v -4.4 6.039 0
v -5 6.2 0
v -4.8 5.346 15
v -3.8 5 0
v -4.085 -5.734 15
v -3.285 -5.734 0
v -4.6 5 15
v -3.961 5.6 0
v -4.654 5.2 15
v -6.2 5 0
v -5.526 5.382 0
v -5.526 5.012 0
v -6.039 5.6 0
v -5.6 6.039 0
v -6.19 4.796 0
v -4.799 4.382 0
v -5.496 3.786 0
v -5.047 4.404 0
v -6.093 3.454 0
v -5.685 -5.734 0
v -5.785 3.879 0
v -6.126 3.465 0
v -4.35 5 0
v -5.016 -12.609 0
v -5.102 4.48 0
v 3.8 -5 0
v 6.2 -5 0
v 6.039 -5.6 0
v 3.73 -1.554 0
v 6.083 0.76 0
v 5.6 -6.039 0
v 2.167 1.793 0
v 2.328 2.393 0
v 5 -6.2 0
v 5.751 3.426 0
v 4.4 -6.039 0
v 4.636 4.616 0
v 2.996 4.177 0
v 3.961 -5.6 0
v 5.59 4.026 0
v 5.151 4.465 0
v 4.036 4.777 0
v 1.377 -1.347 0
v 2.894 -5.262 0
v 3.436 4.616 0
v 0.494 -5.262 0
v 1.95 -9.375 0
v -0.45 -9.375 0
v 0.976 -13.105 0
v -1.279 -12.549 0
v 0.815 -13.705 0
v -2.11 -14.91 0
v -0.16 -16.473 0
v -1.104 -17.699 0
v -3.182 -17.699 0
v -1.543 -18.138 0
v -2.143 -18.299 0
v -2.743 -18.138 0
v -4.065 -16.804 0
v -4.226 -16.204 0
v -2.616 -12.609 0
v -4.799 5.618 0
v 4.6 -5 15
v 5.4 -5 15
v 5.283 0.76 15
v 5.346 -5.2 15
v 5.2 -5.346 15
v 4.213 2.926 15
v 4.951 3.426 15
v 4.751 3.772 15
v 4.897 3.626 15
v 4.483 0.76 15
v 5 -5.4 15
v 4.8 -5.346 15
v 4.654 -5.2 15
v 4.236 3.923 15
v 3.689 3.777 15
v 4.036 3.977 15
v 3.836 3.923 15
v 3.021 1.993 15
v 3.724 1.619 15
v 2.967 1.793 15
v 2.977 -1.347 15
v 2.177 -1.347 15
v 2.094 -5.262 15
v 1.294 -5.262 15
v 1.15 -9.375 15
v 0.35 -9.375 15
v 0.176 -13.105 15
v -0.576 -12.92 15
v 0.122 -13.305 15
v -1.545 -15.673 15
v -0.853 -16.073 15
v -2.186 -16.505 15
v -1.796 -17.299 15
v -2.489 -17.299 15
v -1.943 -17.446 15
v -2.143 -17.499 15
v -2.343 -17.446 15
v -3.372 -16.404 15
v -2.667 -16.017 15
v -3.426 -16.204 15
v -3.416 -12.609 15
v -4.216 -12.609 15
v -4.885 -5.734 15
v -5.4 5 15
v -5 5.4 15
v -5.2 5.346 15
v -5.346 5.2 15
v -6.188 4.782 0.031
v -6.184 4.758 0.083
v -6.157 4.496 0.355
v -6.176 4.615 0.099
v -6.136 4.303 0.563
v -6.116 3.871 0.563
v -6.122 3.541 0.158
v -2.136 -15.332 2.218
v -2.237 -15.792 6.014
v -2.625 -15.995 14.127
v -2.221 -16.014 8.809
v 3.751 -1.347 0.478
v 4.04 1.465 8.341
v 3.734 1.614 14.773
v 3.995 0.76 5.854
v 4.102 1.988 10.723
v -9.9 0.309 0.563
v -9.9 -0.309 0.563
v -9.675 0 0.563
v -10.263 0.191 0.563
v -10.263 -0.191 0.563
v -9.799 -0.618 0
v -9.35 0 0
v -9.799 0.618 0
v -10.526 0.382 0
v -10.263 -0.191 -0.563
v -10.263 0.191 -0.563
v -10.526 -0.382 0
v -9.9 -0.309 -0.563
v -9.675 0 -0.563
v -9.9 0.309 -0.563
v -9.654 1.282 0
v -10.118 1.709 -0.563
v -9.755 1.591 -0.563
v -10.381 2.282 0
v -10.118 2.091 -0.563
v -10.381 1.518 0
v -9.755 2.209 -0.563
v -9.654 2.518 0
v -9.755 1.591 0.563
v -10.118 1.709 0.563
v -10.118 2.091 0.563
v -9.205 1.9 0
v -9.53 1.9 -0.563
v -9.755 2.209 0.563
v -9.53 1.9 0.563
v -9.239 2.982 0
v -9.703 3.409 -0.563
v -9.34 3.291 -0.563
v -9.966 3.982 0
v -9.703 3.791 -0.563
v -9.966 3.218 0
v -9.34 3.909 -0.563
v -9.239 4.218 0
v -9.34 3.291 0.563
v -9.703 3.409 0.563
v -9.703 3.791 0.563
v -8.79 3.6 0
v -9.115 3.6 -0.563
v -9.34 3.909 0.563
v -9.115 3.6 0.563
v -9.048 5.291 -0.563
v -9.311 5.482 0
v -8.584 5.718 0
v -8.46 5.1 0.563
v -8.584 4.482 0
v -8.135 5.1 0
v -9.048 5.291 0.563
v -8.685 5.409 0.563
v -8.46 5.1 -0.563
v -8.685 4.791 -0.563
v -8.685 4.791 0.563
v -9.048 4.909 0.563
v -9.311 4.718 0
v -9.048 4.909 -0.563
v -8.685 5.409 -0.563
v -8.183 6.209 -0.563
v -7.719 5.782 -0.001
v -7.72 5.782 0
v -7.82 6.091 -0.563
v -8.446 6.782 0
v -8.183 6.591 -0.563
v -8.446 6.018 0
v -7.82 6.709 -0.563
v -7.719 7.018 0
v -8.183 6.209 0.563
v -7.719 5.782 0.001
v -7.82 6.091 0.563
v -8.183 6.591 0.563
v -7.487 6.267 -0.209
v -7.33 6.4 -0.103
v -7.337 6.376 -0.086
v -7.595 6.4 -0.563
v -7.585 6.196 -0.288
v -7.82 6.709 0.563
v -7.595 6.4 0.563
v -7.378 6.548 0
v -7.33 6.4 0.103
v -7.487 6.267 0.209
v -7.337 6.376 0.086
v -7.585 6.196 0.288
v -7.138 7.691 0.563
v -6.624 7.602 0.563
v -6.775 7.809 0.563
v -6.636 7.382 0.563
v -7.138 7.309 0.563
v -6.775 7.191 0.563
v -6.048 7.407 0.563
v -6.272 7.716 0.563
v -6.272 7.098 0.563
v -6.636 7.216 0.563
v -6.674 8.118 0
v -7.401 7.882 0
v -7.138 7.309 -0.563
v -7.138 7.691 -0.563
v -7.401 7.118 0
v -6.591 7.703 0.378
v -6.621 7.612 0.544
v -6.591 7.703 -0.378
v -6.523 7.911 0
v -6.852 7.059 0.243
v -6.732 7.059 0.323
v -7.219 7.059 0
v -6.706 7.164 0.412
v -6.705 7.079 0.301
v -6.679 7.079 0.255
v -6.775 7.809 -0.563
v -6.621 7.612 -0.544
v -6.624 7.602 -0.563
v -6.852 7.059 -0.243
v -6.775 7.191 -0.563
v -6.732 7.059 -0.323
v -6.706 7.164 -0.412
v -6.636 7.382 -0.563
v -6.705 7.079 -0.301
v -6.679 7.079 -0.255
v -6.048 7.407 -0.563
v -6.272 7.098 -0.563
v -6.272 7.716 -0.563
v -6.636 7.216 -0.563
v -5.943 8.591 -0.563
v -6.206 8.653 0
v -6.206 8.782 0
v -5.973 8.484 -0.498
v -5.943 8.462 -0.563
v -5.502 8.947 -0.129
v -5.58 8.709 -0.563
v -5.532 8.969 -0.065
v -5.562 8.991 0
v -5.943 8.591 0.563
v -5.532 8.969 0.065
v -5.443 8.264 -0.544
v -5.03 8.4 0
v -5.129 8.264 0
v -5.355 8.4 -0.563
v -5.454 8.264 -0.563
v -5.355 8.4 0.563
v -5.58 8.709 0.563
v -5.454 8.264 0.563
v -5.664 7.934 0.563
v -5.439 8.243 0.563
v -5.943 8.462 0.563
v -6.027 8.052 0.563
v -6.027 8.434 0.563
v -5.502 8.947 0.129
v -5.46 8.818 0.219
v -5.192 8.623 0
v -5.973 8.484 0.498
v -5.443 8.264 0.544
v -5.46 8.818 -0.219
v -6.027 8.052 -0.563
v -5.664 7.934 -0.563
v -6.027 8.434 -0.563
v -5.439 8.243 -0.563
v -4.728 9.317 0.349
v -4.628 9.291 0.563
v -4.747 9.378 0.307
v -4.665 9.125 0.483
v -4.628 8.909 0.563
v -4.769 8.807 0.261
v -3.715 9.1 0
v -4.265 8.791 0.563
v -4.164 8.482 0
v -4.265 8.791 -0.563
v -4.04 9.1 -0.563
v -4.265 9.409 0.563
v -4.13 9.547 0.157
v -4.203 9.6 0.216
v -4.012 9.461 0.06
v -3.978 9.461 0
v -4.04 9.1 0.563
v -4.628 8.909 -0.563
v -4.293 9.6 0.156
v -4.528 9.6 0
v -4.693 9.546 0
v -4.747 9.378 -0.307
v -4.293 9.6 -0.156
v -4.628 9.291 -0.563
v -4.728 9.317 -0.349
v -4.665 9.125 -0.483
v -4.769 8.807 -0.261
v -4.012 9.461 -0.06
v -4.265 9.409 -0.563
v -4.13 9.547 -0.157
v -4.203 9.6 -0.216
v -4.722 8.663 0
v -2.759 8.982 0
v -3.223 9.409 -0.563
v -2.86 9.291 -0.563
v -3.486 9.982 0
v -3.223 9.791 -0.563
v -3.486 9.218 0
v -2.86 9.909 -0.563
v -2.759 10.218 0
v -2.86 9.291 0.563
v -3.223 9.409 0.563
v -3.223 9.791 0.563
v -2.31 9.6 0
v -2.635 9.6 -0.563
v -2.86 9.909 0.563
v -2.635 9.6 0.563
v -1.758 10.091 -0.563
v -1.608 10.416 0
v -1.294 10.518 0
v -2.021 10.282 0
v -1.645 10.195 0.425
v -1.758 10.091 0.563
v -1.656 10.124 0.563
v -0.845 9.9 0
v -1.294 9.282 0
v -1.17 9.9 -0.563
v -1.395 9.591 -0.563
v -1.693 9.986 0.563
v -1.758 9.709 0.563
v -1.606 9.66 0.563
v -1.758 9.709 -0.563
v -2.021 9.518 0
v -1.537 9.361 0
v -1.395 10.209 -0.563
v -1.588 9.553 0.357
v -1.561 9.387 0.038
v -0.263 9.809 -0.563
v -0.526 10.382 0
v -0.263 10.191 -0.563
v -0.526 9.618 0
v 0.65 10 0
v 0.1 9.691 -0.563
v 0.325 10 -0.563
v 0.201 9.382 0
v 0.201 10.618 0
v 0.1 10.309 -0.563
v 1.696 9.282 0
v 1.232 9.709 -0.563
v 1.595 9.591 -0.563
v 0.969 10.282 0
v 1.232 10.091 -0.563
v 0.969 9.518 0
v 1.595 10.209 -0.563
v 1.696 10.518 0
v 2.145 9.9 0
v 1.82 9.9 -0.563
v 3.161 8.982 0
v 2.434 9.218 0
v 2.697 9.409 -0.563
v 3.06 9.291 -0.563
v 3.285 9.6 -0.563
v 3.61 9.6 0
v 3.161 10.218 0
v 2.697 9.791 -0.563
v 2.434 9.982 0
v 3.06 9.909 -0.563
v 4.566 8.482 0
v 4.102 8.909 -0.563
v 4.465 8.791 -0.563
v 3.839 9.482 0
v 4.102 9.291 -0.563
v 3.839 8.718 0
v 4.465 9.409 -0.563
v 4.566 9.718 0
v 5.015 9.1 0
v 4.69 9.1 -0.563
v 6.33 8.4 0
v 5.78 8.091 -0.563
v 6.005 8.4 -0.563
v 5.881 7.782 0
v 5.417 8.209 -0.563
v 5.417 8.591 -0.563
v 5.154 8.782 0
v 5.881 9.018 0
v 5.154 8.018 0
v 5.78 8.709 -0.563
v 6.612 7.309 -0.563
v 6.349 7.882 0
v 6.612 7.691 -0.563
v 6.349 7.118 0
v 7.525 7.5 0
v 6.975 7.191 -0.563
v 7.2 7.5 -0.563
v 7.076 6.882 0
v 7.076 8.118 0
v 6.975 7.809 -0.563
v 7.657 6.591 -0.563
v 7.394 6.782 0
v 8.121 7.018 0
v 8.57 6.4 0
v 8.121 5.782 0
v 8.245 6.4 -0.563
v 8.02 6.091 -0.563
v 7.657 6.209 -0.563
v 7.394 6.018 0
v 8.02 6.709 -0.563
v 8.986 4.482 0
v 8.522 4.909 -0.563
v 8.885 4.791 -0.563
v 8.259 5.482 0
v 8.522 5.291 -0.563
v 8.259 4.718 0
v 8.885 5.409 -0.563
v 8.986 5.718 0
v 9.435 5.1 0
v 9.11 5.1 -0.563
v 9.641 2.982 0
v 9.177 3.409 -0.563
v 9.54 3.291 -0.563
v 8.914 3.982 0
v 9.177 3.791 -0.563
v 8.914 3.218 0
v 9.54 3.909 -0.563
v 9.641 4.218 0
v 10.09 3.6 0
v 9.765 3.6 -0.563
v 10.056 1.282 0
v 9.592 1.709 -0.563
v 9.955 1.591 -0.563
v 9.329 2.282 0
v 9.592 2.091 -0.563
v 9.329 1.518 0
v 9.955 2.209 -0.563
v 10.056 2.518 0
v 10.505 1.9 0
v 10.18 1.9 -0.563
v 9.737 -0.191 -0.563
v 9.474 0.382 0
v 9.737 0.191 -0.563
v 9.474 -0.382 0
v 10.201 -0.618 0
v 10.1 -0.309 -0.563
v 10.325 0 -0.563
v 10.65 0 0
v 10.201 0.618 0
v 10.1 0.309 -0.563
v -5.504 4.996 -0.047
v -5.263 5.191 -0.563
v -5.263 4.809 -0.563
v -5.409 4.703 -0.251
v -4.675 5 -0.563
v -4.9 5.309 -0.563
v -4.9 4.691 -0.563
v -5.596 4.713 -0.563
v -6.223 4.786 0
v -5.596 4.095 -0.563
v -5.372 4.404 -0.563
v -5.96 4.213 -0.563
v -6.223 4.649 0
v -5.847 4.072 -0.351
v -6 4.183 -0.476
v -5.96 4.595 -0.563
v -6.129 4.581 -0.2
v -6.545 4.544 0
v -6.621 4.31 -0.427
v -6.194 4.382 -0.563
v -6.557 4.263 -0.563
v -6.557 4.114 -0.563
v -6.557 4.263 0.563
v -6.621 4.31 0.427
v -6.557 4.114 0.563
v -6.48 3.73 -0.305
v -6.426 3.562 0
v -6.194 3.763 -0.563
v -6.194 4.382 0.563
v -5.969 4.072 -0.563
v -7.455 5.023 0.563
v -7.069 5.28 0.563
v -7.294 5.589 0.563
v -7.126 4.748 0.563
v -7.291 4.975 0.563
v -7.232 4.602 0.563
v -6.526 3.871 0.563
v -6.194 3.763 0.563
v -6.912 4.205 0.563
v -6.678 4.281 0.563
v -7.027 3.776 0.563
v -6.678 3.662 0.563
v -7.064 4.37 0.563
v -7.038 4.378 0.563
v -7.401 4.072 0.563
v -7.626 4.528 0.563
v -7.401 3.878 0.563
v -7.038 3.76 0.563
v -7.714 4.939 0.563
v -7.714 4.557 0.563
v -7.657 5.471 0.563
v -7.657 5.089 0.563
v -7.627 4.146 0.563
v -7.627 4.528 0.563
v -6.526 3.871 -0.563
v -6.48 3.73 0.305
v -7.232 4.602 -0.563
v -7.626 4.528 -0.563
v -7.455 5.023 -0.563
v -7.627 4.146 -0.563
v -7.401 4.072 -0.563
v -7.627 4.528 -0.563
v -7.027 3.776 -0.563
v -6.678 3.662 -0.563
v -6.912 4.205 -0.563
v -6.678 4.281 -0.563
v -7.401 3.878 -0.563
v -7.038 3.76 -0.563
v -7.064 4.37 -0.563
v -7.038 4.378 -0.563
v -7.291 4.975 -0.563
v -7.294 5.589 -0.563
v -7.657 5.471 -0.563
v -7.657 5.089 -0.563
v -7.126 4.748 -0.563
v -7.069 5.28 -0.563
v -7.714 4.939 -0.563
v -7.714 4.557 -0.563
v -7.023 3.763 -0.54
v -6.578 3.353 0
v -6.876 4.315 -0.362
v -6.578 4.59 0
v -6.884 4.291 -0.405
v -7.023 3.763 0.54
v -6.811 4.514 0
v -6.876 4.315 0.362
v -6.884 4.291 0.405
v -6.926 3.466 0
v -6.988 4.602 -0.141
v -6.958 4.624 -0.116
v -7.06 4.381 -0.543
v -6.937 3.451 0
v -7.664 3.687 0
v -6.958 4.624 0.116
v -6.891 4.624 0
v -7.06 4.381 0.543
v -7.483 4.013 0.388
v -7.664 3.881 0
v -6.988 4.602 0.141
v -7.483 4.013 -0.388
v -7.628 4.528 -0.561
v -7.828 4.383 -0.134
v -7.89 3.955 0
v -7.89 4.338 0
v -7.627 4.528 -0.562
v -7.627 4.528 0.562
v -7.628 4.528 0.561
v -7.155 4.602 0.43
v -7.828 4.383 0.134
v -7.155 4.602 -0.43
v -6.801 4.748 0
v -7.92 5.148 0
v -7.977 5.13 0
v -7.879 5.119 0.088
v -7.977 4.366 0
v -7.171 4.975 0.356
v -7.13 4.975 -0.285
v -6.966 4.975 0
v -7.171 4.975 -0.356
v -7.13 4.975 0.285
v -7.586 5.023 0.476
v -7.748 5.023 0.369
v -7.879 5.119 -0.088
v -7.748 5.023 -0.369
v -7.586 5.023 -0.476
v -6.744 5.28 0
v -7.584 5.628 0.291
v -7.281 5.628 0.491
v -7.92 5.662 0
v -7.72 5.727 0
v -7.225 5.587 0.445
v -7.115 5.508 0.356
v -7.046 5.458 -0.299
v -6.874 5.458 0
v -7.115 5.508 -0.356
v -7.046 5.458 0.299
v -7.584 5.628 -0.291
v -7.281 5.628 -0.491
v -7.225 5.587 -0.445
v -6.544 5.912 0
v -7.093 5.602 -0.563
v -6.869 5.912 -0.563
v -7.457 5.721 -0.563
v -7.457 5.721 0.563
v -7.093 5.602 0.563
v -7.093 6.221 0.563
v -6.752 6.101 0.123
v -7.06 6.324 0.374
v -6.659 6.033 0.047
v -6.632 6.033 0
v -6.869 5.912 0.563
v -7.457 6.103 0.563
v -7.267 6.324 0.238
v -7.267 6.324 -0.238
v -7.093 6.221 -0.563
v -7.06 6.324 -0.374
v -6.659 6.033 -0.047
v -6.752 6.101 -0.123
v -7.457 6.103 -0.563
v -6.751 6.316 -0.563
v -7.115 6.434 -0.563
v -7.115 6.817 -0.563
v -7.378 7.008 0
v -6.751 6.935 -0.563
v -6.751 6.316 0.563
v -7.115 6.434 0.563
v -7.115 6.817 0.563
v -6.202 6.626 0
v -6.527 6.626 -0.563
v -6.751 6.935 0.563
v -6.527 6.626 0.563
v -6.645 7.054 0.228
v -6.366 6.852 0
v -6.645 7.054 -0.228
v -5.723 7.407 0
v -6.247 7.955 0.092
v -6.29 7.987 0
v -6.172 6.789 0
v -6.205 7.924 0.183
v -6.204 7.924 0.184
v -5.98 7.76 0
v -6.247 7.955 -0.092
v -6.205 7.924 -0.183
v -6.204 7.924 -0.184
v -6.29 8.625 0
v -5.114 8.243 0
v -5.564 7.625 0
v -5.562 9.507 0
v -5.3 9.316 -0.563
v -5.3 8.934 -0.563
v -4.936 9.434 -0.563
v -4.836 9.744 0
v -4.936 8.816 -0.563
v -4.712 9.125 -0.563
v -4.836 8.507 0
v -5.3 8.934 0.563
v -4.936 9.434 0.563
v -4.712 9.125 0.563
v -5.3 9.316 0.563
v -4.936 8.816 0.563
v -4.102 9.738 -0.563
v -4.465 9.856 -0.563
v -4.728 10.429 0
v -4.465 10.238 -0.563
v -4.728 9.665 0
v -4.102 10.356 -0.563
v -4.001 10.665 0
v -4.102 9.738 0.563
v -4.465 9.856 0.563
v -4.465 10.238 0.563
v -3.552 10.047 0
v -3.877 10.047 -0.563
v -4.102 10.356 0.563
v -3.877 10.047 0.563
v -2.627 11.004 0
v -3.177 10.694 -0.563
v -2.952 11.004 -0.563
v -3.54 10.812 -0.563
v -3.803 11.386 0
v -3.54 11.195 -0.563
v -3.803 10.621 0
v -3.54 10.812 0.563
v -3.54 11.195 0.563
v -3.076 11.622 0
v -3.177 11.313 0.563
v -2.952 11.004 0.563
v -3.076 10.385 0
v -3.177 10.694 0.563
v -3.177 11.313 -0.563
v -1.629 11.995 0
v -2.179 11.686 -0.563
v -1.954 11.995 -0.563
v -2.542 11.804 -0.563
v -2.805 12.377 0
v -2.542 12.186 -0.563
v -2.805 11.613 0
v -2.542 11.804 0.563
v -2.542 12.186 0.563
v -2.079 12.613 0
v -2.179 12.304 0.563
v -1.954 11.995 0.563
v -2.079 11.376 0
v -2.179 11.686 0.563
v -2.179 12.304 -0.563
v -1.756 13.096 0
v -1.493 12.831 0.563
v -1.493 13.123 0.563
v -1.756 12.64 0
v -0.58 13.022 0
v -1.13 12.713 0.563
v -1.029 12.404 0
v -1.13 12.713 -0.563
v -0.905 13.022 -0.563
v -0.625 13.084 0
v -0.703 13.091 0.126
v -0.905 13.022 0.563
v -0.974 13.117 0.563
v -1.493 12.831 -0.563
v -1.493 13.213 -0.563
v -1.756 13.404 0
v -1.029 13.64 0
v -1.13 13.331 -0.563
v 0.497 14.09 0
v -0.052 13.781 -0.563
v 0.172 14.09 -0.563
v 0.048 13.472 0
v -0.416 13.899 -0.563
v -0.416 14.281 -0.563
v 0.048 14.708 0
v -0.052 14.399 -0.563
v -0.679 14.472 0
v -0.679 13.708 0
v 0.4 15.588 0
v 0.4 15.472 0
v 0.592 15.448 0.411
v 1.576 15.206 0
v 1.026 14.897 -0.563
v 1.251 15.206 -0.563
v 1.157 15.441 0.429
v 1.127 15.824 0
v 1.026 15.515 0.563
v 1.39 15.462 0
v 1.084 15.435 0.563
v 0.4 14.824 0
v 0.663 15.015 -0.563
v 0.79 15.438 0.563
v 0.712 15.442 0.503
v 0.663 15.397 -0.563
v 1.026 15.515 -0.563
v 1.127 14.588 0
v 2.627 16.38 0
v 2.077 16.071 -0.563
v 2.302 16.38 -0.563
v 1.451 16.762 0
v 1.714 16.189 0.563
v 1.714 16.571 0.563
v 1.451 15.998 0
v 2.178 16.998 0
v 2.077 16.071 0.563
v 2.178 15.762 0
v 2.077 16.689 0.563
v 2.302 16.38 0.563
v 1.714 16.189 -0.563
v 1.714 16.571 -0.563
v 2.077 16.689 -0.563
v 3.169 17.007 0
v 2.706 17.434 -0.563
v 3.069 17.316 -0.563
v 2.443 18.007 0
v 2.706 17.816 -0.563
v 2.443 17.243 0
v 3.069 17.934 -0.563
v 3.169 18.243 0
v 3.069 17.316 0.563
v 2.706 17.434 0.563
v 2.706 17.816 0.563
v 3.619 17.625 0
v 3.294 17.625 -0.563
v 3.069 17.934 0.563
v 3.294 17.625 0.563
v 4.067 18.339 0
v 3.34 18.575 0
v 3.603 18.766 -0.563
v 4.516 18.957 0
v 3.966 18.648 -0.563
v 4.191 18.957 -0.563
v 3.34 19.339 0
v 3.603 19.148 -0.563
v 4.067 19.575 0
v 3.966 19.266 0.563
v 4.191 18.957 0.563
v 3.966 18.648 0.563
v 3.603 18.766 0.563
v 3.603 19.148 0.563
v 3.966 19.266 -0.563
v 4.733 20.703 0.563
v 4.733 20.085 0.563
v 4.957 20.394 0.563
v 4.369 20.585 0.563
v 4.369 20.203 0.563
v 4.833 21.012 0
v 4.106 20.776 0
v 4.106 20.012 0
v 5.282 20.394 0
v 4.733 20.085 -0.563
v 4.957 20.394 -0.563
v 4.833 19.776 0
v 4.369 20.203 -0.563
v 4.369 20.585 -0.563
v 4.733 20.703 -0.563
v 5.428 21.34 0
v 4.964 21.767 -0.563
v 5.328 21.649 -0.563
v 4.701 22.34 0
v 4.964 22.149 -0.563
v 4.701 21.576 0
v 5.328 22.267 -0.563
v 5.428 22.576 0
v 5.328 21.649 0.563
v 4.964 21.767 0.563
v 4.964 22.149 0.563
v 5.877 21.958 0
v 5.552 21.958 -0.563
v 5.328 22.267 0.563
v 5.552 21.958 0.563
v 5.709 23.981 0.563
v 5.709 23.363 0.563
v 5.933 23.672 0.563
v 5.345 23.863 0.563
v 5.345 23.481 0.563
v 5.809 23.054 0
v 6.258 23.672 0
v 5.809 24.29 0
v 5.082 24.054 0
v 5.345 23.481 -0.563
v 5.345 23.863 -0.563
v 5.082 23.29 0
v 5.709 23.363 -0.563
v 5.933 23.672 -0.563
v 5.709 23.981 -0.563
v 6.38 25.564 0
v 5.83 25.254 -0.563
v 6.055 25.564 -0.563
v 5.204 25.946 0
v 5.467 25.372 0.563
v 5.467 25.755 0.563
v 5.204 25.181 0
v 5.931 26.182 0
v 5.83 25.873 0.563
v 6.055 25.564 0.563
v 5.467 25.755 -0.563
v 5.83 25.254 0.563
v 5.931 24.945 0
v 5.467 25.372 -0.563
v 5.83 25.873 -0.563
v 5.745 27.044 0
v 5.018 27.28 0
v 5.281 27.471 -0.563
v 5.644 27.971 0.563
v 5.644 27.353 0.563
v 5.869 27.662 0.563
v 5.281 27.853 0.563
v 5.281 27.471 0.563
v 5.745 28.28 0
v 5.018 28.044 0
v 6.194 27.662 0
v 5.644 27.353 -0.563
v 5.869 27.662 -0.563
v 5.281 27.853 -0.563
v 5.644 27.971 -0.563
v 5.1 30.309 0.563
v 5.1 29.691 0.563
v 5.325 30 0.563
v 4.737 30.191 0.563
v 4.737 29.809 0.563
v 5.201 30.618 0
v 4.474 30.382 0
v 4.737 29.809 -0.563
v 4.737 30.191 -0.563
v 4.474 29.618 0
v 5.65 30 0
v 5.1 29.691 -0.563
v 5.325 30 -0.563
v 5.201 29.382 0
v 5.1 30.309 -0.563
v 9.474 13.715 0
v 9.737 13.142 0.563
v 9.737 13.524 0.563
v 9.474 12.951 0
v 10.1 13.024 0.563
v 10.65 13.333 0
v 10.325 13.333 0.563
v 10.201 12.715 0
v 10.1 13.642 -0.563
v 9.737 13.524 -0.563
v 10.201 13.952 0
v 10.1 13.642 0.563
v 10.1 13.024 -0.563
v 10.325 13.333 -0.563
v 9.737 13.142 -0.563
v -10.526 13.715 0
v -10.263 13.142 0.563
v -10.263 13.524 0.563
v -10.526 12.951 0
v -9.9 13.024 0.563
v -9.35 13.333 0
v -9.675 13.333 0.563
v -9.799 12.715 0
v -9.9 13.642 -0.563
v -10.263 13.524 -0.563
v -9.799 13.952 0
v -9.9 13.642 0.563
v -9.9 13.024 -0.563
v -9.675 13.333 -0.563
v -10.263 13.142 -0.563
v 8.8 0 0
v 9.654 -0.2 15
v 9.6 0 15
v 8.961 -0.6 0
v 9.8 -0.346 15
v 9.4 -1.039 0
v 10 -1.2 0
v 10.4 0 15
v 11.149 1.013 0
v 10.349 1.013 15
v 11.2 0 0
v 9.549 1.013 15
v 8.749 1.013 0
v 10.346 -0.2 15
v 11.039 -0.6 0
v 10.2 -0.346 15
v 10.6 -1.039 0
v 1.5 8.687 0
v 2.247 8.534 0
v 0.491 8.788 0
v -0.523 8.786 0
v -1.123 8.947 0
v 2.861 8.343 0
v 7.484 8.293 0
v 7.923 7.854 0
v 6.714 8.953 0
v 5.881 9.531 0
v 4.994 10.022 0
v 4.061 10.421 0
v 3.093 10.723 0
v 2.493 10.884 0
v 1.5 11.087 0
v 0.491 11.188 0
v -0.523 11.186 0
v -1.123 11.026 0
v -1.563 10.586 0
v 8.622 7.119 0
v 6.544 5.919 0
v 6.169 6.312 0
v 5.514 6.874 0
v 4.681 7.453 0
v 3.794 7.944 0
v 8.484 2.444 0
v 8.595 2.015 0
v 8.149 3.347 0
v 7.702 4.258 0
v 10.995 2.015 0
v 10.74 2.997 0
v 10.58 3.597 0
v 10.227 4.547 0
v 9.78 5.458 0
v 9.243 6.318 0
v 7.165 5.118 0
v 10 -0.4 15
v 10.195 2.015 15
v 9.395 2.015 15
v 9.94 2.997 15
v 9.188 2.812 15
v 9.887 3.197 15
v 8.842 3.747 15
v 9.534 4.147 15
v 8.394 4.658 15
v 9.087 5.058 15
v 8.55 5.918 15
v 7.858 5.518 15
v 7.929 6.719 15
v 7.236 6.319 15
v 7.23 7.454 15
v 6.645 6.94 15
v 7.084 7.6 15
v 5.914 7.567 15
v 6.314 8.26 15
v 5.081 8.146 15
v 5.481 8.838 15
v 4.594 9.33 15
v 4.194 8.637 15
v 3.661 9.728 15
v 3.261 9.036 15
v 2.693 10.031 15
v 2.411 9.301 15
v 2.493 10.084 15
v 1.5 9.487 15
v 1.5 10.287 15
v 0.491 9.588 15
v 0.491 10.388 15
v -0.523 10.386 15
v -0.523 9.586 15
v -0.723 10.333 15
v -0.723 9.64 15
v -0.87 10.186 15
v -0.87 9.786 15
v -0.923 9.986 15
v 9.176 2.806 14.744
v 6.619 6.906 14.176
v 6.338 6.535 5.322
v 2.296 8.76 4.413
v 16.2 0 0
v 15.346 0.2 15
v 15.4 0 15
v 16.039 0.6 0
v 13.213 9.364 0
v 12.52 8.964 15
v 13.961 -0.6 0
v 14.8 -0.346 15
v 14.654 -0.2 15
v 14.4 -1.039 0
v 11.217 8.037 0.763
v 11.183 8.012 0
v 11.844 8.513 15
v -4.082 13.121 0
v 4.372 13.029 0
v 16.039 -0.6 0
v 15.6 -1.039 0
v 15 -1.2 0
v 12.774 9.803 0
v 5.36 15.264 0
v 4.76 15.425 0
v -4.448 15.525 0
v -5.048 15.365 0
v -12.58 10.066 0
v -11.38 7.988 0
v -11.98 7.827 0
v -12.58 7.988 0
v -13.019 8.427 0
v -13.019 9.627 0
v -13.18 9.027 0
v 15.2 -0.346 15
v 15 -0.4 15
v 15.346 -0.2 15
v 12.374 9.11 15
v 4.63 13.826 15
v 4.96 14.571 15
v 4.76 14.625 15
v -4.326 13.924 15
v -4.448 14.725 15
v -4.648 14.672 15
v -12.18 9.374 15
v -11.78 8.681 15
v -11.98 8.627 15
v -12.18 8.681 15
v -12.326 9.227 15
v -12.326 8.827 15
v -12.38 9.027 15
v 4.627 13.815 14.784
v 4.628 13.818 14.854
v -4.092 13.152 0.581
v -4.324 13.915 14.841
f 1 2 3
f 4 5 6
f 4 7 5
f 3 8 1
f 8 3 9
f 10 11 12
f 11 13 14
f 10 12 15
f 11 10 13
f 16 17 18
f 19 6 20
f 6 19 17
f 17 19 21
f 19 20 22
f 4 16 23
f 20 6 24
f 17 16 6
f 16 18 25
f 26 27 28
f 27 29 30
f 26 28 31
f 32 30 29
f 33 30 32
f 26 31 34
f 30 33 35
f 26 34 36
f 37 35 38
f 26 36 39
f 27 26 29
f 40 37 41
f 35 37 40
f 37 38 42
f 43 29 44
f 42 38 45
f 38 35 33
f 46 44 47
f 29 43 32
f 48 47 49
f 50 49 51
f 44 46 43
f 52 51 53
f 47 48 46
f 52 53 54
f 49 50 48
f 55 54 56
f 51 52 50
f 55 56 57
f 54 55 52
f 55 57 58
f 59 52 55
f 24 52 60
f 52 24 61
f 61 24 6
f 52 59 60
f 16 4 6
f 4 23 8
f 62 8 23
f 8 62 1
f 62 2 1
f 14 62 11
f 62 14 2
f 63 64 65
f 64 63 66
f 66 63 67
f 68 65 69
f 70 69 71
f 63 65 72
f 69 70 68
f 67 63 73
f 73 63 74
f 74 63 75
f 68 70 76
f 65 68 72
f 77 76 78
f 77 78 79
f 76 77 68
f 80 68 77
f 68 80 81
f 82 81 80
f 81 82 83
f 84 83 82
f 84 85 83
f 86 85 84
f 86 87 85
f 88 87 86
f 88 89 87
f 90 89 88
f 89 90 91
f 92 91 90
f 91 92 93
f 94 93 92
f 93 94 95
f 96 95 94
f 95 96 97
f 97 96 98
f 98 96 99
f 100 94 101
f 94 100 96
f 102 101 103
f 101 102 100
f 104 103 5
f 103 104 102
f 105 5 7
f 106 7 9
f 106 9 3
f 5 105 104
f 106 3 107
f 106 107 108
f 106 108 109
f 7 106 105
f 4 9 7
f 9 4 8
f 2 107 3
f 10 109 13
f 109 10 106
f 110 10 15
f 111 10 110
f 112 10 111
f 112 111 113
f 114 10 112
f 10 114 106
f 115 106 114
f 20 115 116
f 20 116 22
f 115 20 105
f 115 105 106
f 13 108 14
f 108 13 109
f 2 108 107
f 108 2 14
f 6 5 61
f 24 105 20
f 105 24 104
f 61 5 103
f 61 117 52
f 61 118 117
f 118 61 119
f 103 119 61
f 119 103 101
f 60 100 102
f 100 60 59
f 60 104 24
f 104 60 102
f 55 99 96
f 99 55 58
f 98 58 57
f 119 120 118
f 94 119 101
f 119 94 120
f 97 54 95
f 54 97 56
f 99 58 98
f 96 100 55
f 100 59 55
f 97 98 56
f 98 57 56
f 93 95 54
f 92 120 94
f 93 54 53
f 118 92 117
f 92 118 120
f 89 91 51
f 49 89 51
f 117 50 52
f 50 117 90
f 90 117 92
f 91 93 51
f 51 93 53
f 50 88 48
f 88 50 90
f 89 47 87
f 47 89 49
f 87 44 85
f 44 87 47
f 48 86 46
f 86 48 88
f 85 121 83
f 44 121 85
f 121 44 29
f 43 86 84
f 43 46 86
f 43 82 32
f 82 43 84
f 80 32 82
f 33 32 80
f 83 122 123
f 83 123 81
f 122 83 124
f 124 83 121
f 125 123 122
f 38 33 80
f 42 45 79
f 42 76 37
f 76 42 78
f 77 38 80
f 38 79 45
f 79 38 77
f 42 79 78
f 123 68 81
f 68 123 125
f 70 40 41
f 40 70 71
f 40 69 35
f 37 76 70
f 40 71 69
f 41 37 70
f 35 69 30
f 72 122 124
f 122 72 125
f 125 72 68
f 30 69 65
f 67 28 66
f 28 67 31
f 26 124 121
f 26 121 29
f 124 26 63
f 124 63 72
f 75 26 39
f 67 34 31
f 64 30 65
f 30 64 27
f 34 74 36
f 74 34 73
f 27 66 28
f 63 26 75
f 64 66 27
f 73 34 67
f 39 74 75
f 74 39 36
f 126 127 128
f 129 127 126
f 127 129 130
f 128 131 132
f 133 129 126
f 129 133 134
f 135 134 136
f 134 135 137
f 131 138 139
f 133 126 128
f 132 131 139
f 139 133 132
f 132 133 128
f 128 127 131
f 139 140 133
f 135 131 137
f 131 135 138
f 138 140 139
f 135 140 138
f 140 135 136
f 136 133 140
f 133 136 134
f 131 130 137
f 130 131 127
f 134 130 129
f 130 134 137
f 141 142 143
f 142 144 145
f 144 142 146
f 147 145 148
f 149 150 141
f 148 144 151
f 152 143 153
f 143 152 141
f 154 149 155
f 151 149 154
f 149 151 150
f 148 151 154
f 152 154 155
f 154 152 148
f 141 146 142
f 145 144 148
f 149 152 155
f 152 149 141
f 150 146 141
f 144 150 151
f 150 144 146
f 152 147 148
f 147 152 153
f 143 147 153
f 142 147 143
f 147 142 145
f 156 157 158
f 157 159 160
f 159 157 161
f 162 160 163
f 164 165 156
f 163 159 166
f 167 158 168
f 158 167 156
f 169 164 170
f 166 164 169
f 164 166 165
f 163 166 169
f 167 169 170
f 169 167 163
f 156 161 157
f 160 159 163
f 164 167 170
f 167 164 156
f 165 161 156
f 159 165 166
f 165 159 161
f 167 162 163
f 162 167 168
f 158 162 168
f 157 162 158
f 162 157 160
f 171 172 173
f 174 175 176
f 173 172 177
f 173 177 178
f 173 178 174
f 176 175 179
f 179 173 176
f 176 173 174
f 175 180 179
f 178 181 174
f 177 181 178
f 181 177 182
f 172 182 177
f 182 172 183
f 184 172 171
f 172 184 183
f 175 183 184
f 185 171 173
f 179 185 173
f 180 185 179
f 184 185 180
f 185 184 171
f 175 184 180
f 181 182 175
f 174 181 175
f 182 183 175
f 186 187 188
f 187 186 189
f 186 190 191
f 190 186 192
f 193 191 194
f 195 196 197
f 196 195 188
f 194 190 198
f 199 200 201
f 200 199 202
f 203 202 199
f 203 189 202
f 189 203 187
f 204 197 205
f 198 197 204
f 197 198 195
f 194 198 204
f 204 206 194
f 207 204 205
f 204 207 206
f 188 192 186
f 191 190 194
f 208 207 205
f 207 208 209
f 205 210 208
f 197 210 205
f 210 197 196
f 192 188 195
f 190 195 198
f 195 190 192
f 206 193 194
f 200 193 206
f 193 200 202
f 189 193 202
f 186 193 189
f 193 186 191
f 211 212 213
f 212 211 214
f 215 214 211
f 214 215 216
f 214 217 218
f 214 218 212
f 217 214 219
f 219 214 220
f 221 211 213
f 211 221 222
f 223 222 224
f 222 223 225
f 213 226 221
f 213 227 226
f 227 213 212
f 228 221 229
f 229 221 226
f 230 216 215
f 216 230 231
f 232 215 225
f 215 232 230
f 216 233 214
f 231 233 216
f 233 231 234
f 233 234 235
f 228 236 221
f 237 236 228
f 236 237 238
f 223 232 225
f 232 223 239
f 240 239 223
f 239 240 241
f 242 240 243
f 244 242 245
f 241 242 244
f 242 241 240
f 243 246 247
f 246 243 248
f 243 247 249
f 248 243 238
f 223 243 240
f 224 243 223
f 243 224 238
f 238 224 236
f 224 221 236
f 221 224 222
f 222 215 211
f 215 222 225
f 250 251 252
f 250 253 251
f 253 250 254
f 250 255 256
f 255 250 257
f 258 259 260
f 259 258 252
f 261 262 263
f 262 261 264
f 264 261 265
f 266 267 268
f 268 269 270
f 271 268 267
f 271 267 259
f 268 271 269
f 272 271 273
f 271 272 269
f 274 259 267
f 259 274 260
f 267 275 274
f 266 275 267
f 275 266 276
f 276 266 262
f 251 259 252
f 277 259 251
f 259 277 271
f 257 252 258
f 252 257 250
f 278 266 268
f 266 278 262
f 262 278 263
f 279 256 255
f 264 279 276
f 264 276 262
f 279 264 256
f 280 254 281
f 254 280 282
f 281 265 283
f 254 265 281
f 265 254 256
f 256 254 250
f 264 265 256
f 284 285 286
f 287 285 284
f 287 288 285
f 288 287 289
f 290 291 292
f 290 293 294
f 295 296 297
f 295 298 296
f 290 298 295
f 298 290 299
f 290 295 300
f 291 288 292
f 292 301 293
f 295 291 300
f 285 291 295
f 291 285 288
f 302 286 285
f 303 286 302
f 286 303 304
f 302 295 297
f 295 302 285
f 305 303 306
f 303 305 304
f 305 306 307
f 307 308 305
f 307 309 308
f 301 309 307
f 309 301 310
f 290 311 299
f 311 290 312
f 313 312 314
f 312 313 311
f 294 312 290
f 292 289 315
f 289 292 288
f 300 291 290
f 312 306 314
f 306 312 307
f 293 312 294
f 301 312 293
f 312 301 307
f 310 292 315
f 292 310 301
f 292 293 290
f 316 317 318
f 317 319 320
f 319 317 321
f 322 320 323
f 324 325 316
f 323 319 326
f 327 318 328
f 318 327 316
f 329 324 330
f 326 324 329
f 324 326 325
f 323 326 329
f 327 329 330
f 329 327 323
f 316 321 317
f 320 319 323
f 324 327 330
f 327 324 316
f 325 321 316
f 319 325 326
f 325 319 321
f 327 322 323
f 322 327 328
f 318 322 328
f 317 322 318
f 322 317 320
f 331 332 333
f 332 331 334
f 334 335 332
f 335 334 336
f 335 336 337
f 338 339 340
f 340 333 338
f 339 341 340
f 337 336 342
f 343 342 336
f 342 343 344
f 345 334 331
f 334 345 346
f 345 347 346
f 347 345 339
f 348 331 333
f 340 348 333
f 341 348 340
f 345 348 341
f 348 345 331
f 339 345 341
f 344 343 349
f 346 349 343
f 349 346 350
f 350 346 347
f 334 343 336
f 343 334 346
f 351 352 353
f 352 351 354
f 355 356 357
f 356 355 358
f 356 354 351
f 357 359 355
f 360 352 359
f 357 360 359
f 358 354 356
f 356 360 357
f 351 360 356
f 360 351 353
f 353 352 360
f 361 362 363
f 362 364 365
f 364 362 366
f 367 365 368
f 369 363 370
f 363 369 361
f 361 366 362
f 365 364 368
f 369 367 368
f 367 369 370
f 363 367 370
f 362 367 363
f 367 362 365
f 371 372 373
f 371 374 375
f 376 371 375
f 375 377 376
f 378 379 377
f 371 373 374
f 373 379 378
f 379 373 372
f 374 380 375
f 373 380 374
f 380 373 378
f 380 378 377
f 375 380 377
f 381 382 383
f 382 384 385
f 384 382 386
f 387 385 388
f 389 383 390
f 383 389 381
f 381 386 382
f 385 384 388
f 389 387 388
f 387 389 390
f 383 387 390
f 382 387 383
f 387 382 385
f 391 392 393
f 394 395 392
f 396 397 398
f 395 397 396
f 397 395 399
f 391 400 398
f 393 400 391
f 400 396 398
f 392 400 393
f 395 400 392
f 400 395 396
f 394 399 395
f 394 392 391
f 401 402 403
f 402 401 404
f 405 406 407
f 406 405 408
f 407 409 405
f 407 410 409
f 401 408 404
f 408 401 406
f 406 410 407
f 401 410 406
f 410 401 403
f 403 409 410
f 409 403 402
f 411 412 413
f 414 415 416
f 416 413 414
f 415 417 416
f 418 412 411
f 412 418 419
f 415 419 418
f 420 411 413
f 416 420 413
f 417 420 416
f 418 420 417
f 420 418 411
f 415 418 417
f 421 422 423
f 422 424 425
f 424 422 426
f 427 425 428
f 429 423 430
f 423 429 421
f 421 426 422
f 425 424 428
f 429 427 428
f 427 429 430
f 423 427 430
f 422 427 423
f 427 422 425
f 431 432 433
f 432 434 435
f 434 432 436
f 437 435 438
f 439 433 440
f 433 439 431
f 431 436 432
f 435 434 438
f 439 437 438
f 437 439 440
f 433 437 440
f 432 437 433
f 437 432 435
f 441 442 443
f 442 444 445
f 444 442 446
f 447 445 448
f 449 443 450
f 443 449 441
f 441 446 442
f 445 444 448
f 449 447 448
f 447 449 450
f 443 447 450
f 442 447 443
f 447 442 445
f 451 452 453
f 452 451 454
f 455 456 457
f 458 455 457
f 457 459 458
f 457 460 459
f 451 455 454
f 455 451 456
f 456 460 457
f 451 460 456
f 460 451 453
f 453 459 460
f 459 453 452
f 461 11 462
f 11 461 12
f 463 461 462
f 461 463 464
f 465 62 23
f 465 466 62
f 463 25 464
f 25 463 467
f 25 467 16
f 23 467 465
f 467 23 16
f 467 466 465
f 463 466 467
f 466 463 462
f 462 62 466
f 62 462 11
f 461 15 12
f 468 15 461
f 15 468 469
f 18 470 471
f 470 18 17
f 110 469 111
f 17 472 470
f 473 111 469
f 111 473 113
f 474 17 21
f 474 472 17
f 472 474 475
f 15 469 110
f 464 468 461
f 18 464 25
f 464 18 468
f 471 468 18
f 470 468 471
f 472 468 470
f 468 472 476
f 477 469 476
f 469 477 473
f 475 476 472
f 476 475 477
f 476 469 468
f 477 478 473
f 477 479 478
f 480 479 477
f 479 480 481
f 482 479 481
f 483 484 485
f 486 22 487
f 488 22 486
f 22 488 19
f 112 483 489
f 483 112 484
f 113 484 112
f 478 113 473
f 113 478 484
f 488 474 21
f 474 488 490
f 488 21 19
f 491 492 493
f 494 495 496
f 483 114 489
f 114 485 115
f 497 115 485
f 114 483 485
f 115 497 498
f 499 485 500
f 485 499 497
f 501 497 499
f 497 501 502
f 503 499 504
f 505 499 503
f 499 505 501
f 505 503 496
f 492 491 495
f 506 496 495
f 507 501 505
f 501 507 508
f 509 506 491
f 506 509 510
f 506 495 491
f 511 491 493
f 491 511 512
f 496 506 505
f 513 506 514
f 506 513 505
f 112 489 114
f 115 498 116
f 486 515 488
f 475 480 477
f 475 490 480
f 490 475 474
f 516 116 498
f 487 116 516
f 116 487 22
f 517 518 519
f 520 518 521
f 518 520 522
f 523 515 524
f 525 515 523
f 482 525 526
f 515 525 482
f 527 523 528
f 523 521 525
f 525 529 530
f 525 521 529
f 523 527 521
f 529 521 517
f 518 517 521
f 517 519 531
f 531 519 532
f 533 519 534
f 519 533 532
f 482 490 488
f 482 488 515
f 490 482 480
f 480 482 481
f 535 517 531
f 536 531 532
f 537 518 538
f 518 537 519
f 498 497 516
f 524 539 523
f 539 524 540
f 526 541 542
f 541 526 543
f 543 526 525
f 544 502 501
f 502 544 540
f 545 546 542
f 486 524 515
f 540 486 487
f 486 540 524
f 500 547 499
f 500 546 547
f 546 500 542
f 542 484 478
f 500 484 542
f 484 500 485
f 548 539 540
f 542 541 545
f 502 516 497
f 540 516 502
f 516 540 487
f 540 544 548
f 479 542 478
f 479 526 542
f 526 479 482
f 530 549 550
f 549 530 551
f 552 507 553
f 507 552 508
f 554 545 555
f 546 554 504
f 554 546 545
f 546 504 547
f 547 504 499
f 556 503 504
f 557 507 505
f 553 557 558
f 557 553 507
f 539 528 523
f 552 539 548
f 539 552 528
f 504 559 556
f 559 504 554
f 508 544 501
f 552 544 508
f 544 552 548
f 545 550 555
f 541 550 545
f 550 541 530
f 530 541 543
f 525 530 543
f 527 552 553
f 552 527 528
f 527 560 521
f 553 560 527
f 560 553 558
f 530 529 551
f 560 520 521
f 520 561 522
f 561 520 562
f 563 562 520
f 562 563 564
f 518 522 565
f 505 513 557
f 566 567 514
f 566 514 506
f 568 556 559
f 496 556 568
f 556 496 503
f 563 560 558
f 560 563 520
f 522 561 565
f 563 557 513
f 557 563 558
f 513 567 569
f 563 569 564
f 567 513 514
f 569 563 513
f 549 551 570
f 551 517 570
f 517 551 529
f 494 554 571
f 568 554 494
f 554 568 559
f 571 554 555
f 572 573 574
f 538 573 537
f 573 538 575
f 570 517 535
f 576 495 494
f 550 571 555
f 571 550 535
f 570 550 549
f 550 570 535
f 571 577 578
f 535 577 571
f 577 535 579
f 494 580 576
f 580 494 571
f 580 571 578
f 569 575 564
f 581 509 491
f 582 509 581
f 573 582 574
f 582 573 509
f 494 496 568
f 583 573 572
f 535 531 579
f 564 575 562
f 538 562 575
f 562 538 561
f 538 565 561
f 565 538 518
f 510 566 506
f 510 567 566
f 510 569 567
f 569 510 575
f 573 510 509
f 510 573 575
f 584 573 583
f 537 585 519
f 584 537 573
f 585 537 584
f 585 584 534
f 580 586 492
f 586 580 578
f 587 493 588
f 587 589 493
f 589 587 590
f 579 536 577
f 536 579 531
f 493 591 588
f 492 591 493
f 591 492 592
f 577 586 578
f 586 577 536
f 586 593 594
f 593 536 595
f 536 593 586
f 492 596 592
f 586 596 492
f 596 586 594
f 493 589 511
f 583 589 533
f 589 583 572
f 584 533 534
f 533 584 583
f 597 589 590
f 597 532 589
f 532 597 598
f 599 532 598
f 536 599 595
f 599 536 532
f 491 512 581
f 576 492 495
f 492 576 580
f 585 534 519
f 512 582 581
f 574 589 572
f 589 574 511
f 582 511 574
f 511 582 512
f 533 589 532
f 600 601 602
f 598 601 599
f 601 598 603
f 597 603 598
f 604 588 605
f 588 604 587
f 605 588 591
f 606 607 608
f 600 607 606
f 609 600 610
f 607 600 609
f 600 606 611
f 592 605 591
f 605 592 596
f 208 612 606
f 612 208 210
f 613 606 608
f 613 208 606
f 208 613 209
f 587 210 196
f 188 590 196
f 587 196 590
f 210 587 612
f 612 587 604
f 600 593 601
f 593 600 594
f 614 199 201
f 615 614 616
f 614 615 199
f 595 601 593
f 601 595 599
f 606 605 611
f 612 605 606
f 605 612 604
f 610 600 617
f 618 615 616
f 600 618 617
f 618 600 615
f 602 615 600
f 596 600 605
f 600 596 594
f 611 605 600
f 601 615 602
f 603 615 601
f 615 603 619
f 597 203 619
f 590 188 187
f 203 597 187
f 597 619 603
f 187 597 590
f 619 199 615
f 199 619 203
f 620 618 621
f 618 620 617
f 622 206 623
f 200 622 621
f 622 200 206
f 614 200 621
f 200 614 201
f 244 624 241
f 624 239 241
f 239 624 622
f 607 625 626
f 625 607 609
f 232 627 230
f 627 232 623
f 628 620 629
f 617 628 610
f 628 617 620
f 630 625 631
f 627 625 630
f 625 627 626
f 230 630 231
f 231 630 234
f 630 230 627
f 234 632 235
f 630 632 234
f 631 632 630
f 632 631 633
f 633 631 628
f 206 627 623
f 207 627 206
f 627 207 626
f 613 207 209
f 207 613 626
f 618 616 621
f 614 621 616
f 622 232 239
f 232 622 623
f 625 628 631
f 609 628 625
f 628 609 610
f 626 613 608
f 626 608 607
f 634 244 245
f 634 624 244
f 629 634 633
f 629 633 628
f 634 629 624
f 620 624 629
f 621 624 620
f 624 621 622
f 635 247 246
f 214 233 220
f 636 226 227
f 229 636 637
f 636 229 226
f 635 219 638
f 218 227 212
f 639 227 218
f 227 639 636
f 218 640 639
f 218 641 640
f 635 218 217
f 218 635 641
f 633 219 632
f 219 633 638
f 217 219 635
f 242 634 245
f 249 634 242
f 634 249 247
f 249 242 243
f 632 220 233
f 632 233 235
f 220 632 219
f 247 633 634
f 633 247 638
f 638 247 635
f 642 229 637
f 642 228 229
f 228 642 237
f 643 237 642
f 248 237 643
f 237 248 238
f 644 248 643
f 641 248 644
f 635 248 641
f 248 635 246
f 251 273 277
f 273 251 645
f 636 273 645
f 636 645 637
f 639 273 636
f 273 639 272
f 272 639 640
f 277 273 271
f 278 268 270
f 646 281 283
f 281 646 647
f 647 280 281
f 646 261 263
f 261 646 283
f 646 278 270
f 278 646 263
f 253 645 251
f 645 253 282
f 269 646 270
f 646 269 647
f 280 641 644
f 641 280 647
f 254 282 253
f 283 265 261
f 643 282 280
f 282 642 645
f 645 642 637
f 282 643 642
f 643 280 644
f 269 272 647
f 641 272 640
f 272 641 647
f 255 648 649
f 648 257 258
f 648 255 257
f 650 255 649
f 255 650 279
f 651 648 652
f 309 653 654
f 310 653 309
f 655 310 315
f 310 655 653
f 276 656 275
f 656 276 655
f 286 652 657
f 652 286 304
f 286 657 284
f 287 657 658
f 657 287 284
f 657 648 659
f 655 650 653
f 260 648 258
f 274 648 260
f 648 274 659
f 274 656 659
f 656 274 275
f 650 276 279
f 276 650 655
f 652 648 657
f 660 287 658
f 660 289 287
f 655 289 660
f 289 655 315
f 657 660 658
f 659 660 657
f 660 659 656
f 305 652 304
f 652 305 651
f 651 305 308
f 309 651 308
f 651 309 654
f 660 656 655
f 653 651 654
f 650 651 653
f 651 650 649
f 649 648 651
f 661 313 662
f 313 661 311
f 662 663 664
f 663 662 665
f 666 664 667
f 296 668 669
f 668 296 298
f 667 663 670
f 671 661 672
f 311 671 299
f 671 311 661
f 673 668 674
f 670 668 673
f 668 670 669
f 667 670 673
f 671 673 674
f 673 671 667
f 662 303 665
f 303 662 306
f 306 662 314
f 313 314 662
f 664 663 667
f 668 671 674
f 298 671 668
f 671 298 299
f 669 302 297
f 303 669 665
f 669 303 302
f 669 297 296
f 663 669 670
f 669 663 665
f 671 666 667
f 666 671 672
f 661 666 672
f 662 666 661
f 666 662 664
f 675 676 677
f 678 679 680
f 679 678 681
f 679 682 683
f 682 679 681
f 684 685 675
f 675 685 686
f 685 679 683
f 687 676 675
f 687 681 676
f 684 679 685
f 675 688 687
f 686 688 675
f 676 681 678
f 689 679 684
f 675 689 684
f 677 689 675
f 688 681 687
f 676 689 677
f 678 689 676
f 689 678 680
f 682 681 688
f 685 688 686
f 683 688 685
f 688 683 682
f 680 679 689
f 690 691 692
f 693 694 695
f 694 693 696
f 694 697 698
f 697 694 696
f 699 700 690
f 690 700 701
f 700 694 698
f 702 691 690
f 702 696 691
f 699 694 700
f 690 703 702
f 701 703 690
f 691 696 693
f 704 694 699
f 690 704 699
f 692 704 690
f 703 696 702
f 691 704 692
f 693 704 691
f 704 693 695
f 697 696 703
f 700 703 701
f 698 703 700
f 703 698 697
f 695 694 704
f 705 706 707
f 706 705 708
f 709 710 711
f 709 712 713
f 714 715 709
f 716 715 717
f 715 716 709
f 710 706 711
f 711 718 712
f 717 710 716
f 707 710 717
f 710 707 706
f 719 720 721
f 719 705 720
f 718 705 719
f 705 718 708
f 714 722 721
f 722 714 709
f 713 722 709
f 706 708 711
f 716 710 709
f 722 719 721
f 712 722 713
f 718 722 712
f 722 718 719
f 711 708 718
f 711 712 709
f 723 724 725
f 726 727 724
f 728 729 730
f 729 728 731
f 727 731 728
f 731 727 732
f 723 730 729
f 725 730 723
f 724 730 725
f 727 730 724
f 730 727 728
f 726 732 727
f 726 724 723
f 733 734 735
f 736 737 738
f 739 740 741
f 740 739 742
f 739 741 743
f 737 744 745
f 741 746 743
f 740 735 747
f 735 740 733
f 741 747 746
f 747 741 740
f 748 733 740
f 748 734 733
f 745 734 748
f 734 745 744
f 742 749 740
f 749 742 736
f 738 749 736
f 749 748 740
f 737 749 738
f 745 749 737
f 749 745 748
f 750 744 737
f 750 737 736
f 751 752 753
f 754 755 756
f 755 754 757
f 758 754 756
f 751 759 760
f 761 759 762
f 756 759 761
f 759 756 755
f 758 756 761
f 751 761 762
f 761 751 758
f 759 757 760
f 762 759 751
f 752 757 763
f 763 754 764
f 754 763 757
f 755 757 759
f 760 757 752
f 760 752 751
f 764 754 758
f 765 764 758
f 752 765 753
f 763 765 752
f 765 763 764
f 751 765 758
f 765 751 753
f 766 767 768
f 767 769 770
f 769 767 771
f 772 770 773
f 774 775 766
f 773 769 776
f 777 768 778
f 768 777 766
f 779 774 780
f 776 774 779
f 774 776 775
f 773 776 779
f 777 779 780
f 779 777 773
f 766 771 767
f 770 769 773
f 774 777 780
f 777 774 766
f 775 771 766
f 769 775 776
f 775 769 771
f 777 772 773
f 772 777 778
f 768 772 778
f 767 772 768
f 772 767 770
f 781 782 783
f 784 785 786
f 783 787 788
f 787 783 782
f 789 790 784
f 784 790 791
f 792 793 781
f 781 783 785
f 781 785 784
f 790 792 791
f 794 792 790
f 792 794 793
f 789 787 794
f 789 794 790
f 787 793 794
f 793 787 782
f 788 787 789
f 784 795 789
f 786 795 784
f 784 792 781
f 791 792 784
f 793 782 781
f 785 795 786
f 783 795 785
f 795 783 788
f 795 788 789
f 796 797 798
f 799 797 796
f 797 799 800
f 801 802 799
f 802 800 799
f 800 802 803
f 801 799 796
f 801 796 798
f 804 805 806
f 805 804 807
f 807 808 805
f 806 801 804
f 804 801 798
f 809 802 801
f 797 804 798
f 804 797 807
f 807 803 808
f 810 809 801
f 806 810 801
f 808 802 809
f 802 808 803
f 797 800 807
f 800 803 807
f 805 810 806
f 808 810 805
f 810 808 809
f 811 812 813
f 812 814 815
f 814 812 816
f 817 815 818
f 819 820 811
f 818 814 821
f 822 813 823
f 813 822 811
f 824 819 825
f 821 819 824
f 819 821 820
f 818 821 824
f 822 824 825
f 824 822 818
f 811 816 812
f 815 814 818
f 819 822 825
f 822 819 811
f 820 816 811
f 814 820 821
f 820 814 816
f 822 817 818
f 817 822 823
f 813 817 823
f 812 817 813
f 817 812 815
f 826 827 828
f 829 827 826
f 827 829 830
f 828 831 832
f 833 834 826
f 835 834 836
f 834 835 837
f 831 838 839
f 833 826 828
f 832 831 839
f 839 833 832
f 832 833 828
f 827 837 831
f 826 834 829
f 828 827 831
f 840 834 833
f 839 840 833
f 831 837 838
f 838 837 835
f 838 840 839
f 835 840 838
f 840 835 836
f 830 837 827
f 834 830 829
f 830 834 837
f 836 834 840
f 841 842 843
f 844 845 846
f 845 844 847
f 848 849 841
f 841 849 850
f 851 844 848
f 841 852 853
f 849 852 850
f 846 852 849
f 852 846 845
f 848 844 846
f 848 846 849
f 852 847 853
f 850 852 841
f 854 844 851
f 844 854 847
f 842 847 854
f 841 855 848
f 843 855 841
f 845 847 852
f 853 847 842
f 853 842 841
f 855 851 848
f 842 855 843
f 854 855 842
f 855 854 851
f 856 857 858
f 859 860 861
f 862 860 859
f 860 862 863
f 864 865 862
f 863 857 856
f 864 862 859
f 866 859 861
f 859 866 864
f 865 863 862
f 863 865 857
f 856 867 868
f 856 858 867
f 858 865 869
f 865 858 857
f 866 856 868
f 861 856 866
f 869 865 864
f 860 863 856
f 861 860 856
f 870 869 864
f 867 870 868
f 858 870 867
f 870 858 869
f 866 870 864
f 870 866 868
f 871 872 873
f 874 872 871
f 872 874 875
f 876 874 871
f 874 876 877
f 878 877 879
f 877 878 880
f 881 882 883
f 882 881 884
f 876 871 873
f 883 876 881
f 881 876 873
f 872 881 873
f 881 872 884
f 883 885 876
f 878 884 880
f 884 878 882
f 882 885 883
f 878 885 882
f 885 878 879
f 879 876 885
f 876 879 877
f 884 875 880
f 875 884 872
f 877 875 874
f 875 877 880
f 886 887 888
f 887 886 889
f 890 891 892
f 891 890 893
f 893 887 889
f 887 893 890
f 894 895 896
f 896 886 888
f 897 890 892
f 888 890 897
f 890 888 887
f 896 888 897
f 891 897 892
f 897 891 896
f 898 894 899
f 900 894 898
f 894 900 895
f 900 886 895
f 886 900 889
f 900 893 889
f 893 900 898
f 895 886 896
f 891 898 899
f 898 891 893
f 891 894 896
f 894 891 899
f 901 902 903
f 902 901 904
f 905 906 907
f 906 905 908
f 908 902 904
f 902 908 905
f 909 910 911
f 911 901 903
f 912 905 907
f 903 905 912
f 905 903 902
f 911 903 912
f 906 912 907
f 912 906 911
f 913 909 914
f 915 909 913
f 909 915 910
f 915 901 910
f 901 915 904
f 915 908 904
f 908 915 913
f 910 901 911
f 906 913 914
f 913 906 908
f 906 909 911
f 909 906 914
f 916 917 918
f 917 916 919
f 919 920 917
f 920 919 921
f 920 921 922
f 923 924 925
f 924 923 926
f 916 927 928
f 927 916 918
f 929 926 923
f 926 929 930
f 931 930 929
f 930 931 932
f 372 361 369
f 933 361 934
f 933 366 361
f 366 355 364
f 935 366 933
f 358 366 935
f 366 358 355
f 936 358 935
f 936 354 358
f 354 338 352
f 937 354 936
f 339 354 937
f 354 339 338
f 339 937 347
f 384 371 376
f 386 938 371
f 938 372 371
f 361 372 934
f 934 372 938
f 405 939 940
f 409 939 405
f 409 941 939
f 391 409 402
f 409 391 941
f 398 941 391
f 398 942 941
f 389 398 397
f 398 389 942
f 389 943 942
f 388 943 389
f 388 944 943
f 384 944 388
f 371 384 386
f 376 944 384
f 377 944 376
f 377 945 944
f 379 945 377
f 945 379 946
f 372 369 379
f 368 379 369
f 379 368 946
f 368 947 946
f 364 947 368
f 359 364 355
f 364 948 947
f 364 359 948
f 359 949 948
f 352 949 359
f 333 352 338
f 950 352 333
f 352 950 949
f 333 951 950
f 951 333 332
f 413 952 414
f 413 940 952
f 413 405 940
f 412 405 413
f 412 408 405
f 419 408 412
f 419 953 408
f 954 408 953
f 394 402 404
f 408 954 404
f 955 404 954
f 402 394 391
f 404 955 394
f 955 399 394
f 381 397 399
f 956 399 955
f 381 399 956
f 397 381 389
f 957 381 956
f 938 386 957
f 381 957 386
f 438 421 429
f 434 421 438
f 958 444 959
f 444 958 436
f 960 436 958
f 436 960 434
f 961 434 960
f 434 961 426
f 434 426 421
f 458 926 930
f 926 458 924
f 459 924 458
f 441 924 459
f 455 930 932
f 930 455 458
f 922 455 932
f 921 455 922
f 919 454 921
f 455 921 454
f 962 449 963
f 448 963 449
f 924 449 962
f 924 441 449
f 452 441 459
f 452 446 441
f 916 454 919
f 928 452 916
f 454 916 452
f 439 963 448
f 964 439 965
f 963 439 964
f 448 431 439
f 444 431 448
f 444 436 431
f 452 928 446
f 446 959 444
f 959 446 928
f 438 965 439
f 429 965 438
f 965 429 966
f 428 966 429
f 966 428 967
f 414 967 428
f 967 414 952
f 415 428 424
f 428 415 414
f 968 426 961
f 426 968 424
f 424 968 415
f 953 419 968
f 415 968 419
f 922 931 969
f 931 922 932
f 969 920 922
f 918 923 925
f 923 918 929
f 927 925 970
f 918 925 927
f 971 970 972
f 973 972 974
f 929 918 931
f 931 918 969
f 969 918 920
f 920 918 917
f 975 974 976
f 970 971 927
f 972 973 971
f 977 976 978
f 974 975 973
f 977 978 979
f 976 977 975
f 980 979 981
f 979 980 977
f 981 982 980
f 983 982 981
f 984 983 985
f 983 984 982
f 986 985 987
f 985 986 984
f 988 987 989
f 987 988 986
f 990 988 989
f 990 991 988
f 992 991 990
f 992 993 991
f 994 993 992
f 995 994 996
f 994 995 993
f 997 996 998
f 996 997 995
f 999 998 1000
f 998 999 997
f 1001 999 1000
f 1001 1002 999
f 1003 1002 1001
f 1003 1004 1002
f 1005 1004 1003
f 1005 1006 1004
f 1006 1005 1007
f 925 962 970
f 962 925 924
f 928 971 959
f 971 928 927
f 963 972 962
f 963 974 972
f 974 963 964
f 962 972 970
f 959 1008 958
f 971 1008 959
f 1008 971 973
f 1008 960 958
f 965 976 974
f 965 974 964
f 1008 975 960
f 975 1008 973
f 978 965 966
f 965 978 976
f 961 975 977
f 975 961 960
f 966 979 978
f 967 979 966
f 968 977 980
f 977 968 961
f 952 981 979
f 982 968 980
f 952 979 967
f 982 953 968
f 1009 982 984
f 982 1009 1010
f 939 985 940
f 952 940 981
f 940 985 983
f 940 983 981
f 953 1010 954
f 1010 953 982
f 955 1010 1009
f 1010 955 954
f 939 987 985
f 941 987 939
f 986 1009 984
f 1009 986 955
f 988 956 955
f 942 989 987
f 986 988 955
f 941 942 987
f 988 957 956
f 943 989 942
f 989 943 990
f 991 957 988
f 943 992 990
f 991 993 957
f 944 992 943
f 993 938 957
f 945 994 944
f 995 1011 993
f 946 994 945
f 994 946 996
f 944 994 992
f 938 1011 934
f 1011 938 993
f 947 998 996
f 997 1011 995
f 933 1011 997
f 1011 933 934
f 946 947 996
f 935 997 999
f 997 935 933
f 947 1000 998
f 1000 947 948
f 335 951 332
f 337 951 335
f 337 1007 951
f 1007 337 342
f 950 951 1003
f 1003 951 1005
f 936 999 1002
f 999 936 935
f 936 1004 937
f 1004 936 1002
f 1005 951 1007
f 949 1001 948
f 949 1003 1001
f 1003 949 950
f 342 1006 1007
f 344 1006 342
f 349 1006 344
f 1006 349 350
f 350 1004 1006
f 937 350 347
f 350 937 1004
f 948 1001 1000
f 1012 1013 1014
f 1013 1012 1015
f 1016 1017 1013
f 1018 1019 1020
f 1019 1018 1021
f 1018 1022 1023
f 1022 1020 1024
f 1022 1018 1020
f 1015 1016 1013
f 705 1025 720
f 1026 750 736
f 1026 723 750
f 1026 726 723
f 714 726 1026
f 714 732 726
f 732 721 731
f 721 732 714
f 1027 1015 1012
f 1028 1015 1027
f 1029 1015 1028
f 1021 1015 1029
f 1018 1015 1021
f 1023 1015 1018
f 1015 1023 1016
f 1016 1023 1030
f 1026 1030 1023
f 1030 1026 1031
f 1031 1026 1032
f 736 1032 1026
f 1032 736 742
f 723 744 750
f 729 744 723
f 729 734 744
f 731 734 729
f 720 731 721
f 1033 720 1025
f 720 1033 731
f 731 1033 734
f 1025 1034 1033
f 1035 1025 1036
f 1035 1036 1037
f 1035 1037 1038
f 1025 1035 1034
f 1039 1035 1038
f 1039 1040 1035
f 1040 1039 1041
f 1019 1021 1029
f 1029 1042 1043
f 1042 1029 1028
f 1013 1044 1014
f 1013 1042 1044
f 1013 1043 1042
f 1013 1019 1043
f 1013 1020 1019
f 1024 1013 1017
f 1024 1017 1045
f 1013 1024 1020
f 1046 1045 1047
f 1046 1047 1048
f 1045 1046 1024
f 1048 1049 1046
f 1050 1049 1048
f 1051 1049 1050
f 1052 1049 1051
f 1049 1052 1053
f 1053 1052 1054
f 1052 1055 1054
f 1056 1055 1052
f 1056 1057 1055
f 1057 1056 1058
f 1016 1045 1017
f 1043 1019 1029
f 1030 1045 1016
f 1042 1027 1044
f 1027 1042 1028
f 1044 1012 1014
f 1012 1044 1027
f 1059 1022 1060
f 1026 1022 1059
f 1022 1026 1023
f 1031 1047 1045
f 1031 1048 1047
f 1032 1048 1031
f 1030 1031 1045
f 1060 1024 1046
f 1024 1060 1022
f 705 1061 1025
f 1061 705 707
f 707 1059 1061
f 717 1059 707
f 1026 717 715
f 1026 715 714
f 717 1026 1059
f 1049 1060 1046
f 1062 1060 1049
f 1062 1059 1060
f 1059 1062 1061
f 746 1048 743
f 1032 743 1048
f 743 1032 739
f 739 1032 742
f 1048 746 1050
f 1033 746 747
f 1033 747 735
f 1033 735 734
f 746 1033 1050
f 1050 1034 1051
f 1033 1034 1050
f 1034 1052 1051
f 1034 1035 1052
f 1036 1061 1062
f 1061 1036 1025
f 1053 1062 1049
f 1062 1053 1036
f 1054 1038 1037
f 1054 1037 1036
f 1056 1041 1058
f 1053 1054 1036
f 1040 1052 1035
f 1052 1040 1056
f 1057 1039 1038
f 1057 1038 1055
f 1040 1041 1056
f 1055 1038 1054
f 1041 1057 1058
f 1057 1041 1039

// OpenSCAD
// variables
fs = 1;  // roughly the size of straight parts of curves
w1 = 2.4;   // cookie cutter, thicker side
w2 = 0.8;   // cookie cutter, thinner side
h = 15;     // cookie cutter height

// points for examples
p1 = [5, -5];
p2 = [5, 30];
p3 = [-3, -55];
p4 = [-5, 5];
p5 = [10, 0];
p6 = [10, 10*4/3];
p7 = [-10, 10*4/3];
p8 = [-10, 0];

// examples
b_curve([p1, p2, p3, p4]);
//b_curve_rainbow([p1, p3, p2, p4]);
b_curve_rainbow([p5, p6, p7, p8]); // circle shape
b_curve_rainbow([p2, p6, p7, p8, p4]);
rainbow([p2, p6, p7, p8, p4]);
circle_ish(10, 93);     // calculated fn
circle_ish(15, 143, 4); // given fn

// functions and modules
function fn(a, b) = round(sqrt(pow(a[0]-b[0],2) + pow(a[1]-b[1], 2))/fs);
function fn_circle(r, angle) = round((PI *r*angle)/(180*fs));

module shape() cylinder(h, w1/2, w2/2, $fn=12);

module straight_line(a, b)  // a and b are points/vectors
    hull(){ 
       translate(a) shape();
       translate(b) shape();
    }
    
module circle_ish(r, angle, fn)     // r = radius, fn is optional
    if (fn==undef)
        let(fn=fn_circle(r, angle))
            circle_ish_inner(r, angle, fn);
    else
        circle_ish_inner(r, angle, fn);
    
module circle_ish_inner(r, angle, fn)   // gets called by circle_ish()
    let (interval = angle/fn)
    for (i= [0:interval:(angle-interval)]) 
        hull(){
            translate([cos(i)*r, sin(i)*r, 0]) shape(); 
            translate([cos(i+interval)*r, sin(i+interval)*r, 0]) shape(); 
        }
    
module b_curve(pts)             // pts is an array of points
    let (idx=fn(pts[0], pts[len(pts)-1]), n = 1/idx){       
        for (i= [0:idx-1]) 
        hull(){ 
           translate(b_pts(pts, n, i)) shape();
           translate(b_pts(pts, n, i+1)) shape();          
        }
    }
    
function b_pts(pts, n, idx) =       // gets called by b_curve() ...
    len(pts)>2 ?                    // ... and b_curve_rainbow() 
        b_pts([for(i=[0:len(pts)-2])pts[i]], n, idx) * n*idx 
            + b_pts([for(i=[1:len(pts)-1])pts[i]], n, idx) * (1-n*idx)
        : pts[0] * n*idx 
            + pts[1] * (1-n*idx);
            
module b_curve_rainbow(pts)     // use it to find points for Bézier curve
    let (idx=fn(pts[0], pts[len(pts)-1]), n = 1/idx)
    for (i= [0:idx]) 
    color([
        cos(20*i)/2 + 0.5, 
        -sin(20*i)/2 + 0.5, 
        -cos(20*i)/2 + 0.5, 
        1])
    translate(b_pts(pts, n, i)) sphere(0.65);

module rainbow 
    (points,		    // a vector of points
	many_colors = 20)   // determins width of gradient    
{
for (i= [0 : len(points)-1 ])
    color([
        cos(many_colors*i)/2+0.5, 
        -sin(many_colors*i)/2+0.5, 
        -cos(many_colors*i)/2+0.5, 
        1])
    translate(points[i]) sphere(0.65);
}
